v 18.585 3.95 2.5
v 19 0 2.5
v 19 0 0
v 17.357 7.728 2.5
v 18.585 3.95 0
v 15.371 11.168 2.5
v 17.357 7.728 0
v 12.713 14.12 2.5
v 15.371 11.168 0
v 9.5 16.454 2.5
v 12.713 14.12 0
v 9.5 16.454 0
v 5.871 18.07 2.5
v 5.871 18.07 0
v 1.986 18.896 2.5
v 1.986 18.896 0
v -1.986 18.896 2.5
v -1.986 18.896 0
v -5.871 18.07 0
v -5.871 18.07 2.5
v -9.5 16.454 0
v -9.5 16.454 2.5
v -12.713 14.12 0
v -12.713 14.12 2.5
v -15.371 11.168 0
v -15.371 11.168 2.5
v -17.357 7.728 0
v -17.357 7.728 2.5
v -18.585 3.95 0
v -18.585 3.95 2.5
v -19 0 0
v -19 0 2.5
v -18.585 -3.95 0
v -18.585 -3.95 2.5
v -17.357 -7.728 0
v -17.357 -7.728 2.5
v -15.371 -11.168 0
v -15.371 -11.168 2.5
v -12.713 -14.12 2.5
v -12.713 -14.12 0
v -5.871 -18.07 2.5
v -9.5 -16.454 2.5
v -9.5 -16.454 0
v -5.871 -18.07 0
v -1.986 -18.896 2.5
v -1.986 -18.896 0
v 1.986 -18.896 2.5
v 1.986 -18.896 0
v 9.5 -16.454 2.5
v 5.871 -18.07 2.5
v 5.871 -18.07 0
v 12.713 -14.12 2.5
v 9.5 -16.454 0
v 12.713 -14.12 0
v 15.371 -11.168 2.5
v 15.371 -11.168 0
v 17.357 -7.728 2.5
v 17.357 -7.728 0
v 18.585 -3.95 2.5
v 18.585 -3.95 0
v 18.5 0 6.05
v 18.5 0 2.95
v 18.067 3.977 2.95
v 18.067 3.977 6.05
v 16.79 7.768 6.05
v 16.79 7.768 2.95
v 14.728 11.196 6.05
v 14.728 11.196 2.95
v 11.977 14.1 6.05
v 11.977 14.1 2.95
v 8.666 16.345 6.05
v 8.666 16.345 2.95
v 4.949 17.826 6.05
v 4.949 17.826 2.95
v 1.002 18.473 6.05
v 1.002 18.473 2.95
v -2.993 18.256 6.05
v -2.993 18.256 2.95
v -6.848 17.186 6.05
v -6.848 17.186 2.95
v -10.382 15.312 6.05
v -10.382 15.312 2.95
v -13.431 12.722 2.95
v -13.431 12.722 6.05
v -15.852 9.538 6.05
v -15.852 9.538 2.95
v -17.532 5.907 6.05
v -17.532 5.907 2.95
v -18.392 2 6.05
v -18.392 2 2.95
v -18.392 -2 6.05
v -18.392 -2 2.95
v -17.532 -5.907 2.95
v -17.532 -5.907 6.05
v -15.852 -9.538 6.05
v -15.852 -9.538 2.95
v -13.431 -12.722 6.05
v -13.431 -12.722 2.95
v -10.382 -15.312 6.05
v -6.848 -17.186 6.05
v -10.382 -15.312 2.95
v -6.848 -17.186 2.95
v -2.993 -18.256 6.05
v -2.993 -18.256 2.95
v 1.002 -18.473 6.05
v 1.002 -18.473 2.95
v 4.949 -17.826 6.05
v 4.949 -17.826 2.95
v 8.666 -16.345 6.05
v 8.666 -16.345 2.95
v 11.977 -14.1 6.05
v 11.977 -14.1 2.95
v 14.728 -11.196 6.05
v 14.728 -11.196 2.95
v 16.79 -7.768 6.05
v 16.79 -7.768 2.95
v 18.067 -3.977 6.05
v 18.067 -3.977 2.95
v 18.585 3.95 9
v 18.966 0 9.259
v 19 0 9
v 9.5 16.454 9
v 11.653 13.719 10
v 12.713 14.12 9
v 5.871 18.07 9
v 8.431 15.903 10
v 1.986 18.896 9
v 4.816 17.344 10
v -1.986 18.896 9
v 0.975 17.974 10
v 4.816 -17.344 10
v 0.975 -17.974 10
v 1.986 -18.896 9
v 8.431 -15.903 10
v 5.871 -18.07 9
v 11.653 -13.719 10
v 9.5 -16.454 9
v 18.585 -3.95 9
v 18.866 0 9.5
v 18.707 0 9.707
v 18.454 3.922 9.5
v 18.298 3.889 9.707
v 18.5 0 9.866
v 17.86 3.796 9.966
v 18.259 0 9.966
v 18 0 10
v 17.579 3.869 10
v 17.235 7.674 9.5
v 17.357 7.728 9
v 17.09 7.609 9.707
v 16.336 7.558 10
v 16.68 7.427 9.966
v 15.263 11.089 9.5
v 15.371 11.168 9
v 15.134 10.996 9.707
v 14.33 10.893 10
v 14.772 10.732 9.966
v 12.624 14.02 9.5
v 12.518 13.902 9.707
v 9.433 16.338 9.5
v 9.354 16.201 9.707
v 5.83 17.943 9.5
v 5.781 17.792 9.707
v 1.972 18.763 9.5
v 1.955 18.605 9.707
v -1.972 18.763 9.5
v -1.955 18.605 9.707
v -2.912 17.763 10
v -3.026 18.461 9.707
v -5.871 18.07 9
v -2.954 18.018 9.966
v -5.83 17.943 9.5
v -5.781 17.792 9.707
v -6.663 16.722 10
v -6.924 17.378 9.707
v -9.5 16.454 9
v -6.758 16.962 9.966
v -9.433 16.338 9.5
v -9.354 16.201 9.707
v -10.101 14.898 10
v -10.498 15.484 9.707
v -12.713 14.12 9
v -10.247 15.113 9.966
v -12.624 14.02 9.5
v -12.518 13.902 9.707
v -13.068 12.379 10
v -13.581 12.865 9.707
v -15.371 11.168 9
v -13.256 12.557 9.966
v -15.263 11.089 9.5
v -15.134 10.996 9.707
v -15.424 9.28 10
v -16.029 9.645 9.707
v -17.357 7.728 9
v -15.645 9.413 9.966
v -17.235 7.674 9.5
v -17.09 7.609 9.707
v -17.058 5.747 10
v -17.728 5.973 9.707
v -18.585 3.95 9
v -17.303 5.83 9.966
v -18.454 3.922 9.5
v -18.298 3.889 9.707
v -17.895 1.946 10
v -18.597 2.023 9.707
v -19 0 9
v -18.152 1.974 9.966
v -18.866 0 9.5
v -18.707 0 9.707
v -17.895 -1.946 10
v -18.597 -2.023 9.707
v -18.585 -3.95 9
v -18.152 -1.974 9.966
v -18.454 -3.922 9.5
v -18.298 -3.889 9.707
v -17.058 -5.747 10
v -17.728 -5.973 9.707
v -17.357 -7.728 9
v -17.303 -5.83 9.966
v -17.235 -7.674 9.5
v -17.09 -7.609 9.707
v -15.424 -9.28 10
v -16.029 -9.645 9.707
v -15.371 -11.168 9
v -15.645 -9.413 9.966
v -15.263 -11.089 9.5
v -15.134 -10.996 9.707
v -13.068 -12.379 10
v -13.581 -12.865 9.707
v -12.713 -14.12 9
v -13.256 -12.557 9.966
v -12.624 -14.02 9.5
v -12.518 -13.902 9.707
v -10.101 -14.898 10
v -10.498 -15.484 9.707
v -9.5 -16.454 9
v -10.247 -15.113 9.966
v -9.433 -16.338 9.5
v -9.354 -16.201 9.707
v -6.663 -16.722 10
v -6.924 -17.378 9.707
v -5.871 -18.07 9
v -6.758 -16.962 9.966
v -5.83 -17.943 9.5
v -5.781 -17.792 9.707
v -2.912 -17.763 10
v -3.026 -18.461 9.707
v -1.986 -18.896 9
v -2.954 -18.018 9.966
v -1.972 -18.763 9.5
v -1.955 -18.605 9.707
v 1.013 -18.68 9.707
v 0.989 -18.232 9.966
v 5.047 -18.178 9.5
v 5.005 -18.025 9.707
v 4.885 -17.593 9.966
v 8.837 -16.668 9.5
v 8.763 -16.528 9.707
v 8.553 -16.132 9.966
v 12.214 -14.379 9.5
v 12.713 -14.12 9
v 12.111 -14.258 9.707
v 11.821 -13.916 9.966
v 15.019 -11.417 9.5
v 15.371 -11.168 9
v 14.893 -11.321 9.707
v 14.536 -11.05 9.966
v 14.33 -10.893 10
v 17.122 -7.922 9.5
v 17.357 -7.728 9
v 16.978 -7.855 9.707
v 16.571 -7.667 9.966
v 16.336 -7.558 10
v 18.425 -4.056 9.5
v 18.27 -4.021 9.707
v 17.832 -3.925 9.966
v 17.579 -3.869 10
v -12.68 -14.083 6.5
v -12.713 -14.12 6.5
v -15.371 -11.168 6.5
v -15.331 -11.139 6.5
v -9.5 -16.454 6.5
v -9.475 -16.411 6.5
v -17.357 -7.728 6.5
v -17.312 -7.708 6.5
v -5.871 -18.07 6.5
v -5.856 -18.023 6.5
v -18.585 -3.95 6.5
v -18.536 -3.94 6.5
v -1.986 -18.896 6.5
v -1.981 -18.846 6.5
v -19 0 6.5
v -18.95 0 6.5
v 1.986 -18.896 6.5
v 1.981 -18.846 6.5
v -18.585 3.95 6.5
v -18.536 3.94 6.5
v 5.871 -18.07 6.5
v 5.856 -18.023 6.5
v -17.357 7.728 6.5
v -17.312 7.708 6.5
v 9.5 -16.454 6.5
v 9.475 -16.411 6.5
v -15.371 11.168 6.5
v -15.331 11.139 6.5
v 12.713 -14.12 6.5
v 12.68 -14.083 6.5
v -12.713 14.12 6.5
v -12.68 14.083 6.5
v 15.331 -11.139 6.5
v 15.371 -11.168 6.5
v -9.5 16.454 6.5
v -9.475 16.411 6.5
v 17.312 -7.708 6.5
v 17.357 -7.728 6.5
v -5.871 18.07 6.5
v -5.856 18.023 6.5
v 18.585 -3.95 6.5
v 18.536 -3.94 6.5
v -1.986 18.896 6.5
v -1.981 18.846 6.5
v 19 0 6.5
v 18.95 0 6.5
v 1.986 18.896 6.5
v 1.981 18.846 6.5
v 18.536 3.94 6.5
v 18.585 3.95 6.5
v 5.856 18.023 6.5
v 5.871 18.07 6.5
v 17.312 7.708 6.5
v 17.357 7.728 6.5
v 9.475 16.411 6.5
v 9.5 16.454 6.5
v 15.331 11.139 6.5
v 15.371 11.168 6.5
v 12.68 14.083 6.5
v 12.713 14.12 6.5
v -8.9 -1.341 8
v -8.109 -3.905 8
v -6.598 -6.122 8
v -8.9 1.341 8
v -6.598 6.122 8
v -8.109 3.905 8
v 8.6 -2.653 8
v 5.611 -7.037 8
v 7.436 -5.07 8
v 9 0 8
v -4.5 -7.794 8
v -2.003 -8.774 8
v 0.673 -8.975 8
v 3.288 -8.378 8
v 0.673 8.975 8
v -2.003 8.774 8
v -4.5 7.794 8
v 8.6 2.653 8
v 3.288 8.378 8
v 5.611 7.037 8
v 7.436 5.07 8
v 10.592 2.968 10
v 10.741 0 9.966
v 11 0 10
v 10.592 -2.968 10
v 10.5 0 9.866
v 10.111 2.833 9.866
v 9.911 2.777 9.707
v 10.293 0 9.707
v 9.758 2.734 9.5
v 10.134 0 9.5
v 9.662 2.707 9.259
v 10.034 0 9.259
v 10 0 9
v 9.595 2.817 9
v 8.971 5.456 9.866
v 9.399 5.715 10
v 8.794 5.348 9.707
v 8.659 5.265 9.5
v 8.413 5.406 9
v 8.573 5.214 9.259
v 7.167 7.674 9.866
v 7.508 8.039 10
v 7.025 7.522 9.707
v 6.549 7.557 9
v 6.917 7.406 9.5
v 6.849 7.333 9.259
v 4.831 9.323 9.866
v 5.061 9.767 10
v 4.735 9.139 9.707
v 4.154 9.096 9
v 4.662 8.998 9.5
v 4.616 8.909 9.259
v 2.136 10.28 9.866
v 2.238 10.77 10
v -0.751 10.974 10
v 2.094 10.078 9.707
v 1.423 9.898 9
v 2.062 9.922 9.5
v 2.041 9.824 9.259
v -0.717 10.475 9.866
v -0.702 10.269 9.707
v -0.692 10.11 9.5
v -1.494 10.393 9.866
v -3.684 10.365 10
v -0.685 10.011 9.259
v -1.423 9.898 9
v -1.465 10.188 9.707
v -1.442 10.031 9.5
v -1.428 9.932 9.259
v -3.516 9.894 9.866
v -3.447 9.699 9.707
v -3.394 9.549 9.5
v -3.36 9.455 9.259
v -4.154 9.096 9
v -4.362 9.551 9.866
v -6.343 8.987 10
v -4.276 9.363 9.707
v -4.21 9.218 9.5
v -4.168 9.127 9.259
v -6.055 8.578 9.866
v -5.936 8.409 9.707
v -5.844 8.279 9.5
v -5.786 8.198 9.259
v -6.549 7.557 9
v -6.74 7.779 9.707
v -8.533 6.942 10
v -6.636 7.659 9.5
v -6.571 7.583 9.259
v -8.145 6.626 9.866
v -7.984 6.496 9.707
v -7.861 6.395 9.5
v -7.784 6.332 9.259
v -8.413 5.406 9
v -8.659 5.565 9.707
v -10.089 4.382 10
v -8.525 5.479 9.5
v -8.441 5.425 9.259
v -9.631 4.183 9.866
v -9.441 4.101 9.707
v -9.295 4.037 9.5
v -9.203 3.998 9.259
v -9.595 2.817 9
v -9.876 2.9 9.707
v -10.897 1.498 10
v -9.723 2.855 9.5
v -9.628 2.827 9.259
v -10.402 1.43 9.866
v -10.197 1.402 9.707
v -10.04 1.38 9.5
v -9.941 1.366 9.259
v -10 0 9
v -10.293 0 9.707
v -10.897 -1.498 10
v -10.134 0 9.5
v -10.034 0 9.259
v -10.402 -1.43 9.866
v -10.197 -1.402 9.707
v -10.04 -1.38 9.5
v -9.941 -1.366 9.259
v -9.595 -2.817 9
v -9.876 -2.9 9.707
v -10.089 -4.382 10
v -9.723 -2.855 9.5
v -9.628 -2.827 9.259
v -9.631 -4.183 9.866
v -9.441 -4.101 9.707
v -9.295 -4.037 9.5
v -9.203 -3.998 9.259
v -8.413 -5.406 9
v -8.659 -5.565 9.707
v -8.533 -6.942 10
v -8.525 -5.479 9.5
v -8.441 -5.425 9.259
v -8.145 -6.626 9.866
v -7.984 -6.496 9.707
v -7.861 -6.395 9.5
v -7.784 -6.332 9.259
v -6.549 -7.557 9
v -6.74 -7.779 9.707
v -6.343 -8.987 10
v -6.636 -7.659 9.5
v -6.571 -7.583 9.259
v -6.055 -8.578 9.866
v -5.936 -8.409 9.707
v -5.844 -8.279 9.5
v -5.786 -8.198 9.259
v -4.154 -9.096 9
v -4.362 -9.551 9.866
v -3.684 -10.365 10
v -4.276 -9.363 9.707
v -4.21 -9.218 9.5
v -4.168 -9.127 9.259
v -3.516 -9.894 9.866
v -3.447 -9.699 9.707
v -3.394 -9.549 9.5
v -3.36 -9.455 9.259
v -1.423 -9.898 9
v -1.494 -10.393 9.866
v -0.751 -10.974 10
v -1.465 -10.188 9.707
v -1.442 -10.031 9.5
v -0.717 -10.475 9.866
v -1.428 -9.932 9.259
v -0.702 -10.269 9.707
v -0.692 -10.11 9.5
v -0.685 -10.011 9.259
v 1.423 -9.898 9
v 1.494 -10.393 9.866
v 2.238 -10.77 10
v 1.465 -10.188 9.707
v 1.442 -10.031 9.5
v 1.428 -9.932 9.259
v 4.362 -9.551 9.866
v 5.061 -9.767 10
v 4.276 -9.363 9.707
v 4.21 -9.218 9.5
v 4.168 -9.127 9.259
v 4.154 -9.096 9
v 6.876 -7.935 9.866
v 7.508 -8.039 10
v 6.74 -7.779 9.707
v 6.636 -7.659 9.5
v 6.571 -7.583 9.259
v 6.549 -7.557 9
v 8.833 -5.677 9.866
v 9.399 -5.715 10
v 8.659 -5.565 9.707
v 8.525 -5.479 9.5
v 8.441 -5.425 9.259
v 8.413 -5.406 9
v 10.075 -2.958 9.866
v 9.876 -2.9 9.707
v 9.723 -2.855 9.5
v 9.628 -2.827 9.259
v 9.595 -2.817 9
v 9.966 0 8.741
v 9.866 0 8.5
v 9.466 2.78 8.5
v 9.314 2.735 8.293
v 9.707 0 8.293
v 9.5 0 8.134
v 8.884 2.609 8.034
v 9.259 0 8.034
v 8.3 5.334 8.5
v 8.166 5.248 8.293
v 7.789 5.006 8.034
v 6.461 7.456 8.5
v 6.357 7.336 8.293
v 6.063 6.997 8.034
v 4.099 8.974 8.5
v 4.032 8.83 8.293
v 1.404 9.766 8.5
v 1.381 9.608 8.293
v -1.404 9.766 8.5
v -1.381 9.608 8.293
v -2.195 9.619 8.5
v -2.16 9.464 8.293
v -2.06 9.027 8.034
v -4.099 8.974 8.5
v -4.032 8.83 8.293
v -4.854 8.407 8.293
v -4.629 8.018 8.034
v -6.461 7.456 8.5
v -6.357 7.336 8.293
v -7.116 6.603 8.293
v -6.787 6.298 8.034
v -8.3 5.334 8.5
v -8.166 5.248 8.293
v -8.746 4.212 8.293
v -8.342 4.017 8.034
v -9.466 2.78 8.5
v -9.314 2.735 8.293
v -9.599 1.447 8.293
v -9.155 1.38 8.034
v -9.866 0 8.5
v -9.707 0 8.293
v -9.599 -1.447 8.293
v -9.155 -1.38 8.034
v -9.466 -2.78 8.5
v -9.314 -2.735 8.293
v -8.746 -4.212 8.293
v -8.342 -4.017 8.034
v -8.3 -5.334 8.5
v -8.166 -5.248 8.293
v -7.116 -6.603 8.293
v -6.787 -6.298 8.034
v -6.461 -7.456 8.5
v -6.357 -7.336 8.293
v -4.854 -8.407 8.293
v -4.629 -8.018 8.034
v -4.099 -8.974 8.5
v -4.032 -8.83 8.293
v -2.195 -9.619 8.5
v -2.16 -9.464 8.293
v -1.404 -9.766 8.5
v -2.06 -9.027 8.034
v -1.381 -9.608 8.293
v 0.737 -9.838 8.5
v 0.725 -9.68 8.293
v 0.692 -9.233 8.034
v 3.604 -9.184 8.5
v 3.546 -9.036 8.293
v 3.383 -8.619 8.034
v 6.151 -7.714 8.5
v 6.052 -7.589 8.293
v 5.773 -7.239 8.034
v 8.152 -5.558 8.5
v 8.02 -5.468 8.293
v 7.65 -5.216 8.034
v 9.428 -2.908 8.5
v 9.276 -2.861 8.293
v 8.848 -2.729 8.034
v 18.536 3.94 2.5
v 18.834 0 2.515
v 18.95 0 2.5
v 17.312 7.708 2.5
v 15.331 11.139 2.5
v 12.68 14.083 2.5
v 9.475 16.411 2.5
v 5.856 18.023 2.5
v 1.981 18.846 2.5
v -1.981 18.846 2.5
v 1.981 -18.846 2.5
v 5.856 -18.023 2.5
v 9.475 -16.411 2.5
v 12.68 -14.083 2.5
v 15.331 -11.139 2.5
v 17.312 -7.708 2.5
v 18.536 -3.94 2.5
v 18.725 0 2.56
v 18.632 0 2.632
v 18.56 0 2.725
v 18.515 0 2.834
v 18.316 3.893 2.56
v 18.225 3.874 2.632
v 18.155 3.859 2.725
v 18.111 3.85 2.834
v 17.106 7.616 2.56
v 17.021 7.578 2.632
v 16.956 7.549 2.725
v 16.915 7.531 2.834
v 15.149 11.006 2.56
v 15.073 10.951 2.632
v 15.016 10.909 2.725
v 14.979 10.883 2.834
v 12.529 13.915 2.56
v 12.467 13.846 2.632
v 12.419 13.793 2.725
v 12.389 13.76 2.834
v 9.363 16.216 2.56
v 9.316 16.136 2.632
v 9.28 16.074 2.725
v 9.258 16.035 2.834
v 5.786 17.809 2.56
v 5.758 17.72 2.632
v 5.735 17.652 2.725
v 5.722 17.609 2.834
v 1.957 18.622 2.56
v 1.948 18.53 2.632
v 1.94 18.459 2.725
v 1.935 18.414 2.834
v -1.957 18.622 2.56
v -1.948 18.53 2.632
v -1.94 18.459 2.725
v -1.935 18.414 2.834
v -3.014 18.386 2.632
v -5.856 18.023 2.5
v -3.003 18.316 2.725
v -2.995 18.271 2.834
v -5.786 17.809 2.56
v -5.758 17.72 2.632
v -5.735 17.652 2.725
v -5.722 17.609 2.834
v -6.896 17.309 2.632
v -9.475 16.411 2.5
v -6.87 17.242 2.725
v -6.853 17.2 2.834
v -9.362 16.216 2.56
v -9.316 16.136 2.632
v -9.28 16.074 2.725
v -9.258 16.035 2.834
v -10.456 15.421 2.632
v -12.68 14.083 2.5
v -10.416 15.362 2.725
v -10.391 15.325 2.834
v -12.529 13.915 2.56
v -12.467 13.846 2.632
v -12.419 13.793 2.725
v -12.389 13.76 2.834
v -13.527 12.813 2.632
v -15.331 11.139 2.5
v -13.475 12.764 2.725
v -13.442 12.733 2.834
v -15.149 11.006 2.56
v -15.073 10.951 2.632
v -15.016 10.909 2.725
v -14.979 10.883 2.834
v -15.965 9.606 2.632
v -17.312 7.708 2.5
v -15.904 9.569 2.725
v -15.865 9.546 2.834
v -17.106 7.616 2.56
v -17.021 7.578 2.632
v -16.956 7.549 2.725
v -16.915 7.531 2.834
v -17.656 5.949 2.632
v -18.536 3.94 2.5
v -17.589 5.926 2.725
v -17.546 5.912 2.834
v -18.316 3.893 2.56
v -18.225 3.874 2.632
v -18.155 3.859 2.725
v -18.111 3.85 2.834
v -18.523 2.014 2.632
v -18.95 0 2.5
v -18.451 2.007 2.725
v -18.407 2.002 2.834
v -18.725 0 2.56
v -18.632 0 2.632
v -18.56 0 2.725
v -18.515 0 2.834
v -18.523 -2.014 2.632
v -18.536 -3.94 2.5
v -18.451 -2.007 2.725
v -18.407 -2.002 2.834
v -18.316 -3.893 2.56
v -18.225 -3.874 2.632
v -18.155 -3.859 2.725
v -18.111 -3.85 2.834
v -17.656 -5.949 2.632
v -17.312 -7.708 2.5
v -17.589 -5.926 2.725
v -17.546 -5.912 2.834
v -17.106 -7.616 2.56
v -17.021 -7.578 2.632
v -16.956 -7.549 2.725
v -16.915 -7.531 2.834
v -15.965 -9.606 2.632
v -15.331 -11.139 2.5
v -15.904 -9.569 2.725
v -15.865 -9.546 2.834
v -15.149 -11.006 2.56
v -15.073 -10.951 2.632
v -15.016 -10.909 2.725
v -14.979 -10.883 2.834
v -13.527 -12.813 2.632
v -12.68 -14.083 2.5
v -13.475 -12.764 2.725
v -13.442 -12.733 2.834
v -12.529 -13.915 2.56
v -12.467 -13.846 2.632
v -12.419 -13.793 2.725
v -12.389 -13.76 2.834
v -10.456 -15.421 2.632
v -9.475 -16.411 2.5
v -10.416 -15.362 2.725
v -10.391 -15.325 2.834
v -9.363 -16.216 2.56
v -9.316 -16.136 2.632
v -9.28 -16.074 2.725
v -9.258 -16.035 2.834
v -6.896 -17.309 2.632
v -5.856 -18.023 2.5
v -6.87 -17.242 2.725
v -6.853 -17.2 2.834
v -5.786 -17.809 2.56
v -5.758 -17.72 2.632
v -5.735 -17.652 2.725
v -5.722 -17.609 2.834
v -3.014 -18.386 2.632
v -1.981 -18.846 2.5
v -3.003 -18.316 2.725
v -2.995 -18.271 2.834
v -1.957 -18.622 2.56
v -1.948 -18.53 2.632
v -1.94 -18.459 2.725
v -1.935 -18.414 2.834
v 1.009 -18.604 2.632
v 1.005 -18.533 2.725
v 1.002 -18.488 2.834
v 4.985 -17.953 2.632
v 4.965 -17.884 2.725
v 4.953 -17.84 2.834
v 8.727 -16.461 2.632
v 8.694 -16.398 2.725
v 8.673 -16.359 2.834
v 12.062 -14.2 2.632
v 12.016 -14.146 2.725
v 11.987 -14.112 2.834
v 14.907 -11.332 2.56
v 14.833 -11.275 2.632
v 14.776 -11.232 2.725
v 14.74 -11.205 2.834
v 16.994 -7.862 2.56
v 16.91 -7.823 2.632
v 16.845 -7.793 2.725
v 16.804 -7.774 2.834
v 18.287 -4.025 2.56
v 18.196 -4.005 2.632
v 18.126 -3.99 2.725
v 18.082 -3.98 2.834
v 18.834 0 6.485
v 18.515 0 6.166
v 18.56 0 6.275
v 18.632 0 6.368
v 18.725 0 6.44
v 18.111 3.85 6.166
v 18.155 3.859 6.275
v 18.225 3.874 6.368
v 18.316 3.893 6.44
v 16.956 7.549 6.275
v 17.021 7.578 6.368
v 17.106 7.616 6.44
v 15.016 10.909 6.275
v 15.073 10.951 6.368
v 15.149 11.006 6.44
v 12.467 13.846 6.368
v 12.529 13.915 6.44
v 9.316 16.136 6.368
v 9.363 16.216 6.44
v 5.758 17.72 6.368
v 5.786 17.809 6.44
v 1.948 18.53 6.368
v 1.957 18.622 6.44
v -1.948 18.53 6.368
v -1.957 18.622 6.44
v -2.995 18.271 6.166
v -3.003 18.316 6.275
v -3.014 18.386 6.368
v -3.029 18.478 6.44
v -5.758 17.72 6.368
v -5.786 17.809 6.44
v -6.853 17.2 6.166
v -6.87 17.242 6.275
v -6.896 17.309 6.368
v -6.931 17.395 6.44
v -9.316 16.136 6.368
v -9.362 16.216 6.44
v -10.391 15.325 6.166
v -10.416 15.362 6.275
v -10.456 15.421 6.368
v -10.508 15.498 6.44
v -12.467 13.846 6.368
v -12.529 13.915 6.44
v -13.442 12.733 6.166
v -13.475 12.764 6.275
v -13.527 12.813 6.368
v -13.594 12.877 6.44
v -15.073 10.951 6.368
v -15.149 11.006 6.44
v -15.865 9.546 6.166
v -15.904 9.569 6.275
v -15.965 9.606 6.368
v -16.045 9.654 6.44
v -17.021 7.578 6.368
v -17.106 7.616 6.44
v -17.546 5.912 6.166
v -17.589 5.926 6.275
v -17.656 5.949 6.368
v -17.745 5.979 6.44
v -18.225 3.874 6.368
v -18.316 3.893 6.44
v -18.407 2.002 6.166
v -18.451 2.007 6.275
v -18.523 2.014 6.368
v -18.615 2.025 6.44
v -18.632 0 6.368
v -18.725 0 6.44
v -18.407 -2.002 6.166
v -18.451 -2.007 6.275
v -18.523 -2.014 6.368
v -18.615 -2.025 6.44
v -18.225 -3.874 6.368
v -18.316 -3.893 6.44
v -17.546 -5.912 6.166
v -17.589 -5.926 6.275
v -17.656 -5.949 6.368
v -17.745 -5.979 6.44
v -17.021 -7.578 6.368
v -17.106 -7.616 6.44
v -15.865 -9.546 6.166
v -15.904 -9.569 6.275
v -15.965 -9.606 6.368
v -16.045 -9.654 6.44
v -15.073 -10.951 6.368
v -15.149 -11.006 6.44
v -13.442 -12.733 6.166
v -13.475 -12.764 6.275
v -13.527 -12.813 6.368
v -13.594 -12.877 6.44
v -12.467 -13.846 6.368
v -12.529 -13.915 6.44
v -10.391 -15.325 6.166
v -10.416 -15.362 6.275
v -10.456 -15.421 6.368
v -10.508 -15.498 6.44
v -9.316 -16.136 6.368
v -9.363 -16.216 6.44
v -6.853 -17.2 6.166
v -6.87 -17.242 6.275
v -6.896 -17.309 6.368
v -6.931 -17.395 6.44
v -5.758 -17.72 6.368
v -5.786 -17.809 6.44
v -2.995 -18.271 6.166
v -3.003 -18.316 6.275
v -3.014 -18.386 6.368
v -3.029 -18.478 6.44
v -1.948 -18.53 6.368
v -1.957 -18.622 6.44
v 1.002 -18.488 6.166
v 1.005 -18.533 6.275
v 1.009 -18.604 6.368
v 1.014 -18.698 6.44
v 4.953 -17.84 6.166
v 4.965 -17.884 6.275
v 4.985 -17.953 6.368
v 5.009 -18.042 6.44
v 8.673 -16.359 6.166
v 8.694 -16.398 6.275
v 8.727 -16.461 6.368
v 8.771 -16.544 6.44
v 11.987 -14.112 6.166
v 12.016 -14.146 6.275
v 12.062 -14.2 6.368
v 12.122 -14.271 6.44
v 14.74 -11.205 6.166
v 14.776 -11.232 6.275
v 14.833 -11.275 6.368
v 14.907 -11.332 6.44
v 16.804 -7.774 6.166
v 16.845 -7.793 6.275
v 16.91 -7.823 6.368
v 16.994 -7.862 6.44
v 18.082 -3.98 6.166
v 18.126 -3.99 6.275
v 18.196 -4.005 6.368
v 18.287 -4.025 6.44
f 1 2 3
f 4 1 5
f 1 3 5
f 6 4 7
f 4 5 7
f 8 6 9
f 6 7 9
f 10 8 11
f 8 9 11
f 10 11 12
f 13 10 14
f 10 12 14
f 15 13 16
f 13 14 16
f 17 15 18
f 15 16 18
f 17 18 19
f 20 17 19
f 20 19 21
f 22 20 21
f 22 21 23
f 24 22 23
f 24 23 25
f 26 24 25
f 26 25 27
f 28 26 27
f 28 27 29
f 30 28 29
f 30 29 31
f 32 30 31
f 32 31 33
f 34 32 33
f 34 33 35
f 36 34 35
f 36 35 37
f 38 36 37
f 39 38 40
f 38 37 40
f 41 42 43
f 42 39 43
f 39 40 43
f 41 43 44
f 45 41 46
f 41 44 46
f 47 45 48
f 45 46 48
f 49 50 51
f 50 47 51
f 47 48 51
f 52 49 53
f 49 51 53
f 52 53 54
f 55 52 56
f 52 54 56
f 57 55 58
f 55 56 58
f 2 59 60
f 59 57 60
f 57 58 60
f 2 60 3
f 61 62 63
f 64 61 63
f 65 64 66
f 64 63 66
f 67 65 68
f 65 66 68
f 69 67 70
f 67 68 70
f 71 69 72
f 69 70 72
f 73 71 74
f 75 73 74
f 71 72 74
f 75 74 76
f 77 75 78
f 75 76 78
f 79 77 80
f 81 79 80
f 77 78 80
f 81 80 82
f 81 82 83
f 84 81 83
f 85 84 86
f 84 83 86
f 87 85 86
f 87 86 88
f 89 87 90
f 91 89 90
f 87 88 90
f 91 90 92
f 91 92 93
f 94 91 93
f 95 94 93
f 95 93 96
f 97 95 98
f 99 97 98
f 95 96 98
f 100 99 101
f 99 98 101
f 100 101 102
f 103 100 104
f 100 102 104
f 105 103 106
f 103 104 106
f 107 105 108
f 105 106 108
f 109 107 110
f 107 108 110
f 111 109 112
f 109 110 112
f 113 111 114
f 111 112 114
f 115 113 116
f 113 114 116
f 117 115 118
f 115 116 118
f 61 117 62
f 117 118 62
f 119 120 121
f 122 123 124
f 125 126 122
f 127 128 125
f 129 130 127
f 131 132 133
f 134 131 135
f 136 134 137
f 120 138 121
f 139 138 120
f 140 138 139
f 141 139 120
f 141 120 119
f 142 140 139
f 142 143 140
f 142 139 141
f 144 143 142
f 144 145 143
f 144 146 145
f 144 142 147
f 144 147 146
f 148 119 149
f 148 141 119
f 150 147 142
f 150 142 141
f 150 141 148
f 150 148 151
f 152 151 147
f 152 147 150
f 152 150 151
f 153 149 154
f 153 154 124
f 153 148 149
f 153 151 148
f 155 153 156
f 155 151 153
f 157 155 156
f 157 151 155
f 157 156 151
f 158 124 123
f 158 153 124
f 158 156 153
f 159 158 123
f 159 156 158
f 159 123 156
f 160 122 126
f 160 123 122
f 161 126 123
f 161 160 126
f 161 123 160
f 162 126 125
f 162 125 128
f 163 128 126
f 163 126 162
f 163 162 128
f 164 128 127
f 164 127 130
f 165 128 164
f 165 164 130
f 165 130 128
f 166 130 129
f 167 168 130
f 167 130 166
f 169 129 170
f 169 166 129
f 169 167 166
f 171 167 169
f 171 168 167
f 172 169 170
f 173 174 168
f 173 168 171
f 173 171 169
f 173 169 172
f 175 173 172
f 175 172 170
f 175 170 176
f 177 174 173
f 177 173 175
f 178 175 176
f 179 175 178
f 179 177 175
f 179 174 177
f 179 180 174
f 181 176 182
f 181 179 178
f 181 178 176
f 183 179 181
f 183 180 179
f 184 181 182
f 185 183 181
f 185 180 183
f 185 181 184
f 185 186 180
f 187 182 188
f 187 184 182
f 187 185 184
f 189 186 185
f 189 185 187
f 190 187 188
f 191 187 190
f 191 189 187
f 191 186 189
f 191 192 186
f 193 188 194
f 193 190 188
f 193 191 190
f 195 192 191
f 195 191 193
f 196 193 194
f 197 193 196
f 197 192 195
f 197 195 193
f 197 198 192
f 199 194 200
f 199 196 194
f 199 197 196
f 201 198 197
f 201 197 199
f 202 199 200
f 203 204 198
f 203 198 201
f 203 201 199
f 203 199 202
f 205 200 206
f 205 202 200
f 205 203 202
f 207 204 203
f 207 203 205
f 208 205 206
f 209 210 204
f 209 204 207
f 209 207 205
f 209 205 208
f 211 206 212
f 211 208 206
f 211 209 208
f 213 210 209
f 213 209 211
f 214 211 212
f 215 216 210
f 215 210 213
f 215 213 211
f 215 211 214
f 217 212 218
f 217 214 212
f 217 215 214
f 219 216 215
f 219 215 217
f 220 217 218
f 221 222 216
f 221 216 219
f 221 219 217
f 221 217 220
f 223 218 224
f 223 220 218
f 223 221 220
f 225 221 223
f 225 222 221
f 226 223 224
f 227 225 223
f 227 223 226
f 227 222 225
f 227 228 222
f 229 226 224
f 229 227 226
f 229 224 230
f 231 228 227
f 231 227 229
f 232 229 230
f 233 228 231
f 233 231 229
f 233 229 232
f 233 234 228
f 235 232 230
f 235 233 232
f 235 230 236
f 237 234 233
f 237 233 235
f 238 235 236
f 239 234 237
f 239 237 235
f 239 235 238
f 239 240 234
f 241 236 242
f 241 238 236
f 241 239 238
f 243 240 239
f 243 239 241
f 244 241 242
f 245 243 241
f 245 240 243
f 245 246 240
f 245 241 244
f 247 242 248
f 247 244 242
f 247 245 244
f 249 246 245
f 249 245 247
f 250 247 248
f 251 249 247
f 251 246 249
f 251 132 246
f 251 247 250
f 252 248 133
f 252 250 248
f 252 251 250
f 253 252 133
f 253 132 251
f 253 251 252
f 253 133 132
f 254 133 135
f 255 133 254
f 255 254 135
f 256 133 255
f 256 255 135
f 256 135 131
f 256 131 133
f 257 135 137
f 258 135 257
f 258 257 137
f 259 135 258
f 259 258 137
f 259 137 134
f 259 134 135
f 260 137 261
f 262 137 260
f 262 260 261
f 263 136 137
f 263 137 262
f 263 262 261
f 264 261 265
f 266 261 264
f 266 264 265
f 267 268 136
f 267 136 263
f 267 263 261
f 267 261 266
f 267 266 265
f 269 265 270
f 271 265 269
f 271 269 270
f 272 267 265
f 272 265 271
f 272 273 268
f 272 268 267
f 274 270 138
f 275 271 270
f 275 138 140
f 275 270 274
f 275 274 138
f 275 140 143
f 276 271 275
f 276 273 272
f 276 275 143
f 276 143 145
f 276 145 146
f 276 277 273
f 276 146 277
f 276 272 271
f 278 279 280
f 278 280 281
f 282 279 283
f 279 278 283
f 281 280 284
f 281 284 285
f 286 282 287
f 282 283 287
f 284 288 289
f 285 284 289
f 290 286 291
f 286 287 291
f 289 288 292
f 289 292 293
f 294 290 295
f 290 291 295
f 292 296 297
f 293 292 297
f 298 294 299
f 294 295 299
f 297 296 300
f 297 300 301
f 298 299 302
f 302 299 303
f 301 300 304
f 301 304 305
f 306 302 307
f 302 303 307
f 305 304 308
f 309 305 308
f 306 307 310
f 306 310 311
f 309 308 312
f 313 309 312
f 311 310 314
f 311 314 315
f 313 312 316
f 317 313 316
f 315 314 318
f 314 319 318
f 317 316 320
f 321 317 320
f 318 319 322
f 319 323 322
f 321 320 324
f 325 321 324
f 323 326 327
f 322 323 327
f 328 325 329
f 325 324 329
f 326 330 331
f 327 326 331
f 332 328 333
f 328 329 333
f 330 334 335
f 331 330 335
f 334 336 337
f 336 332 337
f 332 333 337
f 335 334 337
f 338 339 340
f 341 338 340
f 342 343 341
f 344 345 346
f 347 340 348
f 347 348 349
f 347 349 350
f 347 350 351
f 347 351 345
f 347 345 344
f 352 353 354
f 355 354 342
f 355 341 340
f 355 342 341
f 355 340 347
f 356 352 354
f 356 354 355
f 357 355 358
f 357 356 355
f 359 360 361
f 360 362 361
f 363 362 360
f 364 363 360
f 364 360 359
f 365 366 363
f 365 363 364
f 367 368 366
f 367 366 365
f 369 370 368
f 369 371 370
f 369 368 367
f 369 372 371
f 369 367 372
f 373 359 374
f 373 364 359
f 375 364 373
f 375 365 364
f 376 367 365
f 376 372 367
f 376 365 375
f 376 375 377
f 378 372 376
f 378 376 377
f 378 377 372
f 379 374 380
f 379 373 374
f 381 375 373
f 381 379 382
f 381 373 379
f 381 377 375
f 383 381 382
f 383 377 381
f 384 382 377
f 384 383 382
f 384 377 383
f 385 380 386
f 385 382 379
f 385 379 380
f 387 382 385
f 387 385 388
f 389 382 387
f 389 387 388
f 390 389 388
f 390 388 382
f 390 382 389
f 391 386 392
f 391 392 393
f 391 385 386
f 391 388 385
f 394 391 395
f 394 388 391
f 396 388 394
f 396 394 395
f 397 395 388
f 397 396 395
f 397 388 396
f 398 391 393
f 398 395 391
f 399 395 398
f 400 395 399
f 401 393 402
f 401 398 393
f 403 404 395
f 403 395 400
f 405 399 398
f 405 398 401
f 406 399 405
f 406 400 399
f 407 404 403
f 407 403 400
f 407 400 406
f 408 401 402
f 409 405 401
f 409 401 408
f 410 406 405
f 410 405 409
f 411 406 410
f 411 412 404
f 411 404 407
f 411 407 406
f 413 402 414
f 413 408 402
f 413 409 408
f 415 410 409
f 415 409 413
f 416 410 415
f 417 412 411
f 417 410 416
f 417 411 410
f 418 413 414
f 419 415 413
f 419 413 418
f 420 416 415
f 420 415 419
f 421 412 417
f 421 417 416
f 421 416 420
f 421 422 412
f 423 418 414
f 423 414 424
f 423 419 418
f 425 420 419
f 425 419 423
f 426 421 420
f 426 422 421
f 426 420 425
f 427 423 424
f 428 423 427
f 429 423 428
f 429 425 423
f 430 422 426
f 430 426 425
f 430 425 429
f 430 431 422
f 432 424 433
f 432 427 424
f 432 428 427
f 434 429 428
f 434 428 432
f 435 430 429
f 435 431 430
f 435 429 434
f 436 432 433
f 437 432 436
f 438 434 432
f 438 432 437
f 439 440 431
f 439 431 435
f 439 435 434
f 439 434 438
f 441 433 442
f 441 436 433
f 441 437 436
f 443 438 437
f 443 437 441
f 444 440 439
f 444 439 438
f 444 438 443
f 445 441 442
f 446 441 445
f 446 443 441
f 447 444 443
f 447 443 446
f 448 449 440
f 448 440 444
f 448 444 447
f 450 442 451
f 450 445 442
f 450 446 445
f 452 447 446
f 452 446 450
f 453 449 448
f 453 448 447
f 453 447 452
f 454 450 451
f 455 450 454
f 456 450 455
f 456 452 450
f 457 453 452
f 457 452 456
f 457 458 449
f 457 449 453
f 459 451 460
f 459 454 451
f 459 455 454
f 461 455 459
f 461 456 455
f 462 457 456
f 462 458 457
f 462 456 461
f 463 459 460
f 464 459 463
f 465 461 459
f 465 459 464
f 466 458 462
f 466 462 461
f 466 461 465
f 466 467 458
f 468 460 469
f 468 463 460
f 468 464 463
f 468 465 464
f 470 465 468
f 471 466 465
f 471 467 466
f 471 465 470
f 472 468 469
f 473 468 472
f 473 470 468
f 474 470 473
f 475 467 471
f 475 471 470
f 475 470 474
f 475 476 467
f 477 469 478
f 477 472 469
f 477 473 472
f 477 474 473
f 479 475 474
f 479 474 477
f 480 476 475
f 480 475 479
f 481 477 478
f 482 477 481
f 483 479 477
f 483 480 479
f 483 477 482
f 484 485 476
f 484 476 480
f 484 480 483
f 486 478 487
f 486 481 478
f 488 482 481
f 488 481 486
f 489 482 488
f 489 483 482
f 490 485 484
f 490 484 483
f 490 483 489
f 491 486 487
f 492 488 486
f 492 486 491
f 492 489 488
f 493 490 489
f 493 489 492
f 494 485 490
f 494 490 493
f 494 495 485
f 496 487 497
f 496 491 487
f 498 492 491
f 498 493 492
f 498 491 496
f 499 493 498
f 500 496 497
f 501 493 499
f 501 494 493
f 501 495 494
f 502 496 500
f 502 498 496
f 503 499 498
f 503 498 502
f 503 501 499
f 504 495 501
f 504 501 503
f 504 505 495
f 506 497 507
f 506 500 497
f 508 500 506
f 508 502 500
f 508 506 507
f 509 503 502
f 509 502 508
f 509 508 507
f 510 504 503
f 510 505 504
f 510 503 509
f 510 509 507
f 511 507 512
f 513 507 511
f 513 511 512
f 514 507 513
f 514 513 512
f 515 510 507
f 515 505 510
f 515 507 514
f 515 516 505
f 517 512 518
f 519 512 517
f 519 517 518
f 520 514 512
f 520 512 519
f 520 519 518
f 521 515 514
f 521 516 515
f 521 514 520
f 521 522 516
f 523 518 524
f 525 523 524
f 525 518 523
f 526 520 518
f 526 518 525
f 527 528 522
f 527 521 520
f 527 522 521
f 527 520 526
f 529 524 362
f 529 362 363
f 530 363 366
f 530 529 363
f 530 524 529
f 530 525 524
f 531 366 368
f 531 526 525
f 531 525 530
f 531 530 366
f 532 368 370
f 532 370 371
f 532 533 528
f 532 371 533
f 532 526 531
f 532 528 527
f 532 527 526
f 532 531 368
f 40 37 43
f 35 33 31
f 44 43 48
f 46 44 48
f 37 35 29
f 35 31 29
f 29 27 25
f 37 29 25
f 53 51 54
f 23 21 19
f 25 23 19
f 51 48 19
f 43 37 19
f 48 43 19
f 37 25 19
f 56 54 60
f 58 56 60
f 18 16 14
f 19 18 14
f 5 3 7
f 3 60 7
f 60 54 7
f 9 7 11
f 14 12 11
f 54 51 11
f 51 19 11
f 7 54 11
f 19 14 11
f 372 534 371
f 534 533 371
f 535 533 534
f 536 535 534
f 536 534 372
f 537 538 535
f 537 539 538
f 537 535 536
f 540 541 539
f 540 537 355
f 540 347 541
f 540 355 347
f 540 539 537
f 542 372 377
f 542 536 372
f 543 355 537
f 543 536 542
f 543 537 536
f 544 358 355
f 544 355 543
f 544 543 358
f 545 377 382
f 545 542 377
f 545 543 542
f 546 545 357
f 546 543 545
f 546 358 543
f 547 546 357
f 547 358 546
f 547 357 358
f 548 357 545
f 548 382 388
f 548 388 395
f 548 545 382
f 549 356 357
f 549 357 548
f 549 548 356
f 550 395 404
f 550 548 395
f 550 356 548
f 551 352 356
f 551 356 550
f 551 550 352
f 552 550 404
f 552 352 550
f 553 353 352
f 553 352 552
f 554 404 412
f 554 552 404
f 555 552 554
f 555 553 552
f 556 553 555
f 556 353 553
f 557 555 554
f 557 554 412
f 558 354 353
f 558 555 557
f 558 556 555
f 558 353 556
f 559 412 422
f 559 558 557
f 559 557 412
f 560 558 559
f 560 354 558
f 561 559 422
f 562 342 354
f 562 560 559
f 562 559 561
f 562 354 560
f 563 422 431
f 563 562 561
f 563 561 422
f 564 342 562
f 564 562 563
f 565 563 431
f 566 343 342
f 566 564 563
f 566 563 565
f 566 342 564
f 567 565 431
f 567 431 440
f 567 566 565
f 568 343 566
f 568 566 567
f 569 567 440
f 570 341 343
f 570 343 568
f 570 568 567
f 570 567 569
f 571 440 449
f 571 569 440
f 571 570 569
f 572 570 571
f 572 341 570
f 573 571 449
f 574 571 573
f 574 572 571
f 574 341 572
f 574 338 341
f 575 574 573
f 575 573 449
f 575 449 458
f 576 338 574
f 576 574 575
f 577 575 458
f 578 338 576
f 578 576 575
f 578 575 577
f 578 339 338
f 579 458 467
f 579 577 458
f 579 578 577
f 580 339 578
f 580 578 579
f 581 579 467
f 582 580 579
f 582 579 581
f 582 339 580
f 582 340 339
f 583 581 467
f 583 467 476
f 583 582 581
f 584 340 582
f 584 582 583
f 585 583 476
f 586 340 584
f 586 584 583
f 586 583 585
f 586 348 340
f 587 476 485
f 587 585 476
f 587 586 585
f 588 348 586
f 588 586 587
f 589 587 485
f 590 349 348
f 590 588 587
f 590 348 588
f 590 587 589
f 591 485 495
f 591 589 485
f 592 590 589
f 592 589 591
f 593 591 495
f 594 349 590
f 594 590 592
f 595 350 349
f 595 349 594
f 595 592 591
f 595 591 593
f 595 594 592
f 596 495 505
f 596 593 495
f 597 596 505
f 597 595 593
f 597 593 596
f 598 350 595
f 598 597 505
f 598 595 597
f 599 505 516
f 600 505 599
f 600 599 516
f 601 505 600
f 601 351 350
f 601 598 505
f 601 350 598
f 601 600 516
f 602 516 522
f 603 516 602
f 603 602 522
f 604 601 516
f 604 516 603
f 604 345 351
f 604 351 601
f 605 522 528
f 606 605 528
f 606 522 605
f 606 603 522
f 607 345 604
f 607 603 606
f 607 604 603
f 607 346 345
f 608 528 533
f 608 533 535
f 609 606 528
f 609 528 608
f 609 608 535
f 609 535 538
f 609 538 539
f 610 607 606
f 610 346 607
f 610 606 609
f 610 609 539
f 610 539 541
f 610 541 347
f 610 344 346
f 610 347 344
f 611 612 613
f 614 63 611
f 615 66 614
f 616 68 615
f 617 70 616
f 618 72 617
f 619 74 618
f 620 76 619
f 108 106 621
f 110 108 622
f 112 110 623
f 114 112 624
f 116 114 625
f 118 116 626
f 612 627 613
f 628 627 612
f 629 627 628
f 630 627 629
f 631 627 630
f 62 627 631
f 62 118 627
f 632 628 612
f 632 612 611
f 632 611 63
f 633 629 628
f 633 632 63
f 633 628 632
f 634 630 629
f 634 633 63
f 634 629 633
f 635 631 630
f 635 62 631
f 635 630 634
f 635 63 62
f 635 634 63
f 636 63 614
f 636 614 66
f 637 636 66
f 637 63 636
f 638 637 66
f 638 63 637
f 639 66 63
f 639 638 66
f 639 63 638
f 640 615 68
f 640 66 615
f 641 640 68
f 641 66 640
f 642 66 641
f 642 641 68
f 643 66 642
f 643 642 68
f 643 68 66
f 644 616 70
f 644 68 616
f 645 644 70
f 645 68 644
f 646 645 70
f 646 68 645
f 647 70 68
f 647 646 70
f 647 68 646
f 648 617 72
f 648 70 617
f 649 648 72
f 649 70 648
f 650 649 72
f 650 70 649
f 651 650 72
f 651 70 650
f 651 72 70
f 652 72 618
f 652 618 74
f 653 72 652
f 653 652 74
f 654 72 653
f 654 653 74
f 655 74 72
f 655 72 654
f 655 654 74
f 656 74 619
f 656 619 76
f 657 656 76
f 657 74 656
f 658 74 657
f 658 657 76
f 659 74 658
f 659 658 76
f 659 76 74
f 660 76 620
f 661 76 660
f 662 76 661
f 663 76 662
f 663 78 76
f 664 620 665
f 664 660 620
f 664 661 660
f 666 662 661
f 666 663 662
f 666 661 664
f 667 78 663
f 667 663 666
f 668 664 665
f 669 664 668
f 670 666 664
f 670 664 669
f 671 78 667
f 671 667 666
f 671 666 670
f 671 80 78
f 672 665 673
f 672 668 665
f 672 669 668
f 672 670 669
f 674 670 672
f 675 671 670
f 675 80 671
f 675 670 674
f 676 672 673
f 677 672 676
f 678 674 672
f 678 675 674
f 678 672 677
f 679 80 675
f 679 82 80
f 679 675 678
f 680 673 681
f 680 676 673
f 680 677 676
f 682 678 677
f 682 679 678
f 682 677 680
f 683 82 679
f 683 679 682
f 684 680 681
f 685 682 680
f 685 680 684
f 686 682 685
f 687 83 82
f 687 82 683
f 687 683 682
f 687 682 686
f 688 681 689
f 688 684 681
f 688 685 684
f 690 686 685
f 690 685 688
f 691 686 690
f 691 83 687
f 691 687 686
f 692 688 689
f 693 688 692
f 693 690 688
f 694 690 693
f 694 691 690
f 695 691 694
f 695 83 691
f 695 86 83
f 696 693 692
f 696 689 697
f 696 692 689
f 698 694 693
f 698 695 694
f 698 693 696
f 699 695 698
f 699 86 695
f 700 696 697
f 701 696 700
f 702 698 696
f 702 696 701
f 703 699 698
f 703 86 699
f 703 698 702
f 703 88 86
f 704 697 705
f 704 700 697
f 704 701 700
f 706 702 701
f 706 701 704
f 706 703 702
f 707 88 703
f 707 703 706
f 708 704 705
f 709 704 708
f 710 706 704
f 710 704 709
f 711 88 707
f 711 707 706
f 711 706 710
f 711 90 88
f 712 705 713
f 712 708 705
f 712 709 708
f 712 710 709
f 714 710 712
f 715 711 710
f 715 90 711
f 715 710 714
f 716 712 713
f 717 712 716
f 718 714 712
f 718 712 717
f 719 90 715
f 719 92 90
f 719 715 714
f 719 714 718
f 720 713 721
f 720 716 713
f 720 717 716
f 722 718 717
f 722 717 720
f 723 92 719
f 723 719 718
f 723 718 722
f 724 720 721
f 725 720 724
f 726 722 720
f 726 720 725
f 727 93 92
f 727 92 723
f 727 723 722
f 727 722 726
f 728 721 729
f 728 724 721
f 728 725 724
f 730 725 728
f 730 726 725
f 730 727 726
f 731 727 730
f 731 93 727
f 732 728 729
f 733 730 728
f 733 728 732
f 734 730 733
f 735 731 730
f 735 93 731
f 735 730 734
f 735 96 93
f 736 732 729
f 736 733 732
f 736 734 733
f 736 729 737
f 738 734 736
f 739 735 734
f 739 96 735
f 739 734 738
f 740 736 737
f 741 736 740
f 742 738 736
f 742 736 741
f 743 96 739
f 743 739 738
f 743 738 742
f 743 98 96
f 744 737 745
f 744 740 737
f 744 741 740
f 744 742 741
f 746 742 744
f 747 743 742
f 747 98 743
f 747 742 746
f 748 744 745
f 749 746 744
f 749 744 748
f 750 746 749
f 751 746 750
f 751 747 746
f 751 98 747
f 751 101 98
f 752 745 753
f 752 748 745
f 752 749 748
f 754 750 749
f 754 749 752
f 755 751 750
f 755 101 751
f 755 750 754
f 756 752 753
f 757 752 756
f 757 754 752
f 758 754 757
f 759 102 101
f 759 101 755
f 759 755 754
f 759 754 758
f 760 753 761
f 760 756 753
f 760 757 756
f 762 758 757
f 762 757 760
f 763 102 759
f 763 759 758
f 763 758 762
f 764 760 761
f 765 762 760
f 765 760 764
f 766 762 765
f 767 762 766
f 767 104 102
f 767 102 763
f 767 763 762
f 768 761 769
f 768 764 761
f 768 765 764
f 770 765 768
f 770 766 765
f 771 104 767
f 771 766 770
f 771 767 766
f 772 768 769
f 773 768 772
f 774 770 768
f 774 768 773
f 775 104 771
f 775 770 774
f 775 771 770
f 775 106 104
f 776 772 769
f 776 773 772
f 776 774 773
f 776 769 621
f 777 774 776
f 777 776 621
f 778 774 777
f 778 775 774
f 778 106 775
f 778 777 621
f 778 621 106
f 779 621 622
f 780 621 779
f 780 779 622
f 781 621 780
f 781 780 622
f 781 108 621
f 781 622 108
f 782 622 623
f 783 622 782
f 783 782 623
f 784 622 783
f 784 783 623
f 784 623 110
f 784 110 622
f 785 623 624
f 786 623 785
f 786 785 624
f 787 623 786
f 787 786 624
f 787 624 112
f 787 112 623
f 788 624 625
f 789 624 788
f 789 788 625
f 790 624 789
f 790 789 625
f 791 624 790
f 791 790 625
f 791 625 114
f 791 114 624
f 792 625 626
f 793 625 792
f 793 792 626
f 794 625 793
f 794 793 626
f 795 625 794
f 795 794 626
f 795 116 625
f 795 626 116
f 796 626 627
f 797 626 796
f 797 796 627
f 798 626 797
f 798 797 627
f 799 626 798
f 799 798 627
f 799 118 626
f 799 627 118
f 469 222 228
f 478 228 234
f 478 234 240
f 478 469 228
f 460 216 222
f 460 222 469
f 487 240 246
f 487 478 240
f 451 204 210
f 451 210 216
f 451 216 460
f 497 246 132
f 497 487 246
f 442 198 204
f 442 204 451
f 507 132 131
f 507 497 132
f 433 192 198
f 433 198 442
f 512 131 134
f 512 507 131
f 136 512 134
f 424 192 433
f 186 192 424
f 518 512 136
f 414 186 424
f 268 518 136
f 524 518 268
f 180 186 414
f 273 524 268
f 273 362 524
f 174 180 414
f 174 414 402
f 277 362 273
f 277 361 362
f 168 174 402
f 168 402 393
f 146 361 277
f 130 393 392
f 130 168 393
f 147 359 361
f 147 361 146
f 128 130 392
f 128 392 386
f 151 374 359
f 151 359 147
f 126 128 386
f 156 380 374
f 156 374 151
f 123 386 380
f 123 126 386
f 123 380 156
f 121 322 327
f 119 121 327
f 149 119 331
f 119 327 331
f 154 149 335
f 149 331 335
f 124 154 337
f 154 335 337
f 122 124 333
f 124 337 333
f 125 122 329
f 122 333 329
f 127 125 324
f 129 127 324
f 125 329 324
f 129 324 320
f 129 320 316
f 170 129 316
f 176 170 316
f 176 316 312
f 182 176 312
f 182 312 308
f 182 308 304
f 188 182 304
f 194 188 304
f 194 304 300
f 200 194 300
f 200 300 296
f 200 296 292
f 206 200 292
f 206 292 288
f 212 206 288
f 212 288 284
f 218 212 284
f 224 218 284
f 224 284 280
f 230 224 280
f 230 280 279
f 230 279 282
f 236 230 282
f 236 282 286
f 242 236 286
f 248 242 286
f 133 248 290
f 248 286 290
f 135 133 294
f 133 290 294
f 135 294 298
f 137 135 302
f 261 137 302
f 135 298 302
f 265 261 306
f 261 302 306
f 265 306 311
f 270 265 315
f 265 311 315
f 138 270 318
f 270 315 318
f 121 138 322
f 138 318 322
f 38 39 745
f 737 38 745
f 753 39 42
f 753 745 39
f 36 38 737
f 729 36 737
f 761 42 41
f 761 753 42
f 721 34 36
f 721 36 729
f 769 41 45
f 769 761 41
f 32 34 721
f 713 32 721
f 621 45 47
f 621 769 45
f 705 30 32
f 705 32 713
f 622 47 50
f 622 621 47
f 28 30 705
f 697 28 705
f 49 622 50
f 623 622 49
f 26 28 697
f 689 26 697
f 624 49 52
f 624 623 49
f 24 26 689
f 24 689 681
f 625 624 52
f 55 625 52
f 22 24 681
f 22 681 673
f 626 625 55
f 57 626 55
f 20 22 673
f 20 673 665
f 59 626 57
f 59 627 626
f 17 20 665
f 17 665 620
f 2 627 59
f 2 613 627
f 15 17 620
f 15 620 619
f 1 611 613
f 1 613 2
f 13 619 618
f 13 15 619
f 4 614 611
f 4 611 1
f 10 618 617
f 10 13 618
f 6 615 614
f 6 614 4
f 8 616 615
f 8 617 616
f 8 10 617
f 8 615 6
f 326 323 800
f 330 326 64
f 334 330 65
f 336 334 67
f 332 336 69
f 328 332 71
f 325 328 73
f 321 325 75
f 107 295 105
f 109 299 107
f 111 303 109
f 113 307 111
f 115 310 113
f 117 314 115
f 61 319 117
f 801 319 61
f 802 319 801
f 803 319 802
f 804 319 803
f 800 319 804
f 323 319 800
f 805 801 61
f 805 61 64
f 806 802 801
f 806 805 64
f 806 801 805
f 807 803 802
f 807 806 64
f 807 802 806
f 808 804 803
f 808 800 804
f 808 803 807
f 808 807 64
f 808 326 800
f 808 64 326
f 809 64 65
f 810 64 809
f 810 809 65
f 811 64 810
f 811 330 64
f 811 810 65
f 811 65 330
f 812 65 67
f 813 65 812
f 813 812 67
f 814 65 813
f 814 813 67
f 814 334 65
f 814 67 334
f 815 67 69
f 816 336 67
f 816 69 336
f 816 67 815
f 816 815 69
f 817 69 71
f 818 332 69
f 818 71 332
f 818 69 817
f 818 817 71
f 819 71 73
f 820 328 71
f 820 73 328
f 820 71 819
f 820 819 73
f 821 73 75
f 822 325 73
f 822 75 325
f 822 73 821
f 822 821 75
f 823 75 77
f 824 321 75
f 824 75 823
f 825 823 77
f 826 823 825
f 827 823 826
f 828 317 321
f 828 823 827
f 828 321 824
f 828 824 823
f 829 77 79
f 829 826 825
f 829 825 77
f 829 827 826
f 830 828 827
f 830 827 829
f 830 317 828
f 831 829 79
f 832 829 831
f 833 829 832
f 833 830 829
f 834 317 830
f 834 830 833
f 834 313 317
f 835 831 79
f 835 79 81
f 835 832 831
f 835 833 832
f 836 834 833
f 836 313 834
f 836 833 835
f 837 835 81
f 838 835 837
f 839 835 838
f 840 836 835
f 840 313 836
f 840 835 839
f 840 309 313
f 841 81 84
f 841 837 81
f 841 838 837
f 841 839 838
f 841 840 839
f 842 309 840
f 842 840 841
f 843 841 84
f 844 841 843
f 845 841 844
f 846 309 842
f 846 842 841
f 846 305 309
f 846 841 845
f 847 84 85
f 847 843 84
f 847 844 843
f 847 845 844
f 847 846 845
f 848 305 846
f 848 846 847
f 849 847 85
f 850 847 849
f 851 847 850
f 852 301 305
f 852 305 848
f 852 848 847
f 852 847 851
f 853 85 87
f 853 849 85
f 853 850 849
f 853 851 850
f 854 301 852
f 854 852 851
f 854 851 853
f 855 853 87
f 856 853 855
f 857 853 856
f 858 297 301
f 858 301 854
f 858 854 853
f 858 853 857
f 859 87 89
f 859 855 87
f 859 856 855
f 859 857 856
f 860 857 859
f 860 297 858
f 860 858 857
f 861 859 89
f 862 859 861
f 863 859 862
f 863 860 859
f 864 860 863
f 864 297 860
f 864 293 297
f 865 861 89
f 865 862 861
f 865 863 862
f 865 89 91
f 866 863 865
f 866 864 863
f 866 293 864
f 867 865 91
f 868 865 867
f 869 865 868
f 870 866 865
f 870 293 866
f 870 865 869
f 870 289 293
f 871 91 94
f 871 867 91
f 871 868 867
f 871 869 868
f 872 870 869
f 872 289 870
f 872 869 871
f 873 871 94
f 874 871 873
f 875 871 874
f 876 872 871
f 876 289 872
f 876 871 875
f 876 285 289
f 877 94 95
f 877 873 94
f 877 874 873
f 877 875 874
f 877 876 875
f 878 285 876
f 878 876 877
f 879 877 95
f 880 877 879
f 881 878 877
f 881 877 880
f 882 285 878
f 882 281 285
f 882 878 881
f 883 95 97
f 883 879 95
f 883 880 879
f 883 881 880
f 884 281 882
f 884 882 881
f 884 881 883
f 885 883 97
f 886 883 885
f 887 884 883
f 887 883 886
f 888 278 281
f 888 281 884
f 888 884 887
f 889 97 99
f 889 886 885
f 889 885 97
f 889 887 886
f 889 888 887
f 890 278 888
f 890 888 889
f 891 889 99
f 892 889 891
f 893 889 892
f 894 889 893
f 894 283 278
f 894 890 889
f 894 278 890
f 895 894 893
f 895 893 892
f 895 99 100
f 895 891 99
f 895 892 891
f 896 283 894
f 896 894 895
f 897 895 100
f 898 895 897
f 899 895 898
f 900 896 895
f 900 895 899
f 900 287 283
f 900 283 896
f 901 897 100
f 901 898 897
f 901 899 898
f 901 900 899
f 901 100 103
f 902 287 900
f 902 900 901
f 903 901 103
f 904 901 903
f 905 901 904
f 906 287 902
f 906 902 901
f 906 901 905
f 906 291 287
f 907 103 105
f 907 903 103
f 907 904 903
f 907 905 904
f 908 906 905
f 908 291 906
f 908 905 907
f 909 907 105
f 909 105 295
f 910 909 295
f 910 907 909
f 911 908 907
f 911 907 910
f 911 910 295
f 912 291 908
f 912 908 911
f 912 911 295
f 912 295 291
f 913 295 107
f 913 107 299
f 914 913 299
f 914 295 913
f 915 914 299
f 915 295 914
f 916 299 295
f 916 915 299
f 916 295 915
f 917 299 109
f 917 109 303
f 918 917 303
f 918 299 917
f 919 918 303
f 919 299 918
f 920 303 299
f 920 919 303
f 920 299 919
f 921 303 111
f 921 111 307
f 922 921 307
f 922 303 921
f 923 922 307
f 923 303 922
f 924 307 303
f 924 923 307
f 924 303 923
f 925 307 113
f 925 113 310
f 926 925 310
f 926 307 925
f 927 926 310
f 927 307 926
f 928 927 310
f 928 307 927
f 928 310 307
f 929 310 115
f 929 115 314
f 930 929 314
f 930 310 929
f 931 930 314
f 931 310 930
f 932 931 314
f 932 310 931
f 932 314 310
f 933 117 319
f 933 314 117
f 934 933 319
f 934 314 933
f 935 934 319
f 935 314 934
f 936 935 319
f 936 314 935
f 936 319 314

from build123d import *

# Parameters (mm, degrees)
SKETCH1_R           = 19
BOSS_EXTRUDE1_DEPTH = 10
SKETCH2_R           = 10
CUT_EXTRUDE1_DEPTH  = 2
FILLET1_R           = 1
SKETCH3_W           = 1
SKETCH3_H           = 4
FILLET2_R           = 0.45


with BuildPart() as part:
    # Sketch1 → Boss-Extrude1 (new body)
    with BuildSketch(Plane.XY):
        Circle(SKETCH1_R)
    extrude(amount=BOSS_EXTRUDE1_DEPTH)

    # Sketch2 → Cut-Extrude1 (cut)
    with BuildSketch(Plane.XY.offset(10)):
        Circle(SKETCH2_R)
    extrude(amount=-CUT_EXTRUDE1_DEPTH, mode=Mode.SUBTRACT)

    # Fillet1
    fillet1_edges = [part.edges().sort_by_distance(p)[0] for p in [
        (-19, 0, 10),
        (-10, 0, 8),
        (-10, 0, 10),
    ]]
    fillet(fillet1_edges, radius=FILLET1_R - 0.0001)  # a hair under: the kernel refuses the full size

    # Sketch3 → Cut-Revolve1 (revolve, cut)
    with BuildSketch(Plane(origin=(0, 0, 0), x_dir=(1, 0, 0), z_dir=(0, 1, 0)), mode=Mode.PRIVATE) as cut_revolve1_sk:
        with Locations((-19, -4.5)):
            Rectangle(SKETCH3_W, SKETCH3_H)
    revolve(cut_revolve1_sk.sketch.rotate(Axis((0, 0, 0), (0, 0, 1)), 180), axis=Axis((0, 0, 0), (0, 0, 1)), mode=Mode.SUBTRACT)

    # Fillet2
    fillet2_edges = [part.edges().sort_by_distance(p)[0] for p in [
        (-18.5, 0, 6.5),
        (-18.5, 0, 2.5),
    ]]
    fillet(fillet2_edges, radius=FILLET2_R)


solid = part.part
